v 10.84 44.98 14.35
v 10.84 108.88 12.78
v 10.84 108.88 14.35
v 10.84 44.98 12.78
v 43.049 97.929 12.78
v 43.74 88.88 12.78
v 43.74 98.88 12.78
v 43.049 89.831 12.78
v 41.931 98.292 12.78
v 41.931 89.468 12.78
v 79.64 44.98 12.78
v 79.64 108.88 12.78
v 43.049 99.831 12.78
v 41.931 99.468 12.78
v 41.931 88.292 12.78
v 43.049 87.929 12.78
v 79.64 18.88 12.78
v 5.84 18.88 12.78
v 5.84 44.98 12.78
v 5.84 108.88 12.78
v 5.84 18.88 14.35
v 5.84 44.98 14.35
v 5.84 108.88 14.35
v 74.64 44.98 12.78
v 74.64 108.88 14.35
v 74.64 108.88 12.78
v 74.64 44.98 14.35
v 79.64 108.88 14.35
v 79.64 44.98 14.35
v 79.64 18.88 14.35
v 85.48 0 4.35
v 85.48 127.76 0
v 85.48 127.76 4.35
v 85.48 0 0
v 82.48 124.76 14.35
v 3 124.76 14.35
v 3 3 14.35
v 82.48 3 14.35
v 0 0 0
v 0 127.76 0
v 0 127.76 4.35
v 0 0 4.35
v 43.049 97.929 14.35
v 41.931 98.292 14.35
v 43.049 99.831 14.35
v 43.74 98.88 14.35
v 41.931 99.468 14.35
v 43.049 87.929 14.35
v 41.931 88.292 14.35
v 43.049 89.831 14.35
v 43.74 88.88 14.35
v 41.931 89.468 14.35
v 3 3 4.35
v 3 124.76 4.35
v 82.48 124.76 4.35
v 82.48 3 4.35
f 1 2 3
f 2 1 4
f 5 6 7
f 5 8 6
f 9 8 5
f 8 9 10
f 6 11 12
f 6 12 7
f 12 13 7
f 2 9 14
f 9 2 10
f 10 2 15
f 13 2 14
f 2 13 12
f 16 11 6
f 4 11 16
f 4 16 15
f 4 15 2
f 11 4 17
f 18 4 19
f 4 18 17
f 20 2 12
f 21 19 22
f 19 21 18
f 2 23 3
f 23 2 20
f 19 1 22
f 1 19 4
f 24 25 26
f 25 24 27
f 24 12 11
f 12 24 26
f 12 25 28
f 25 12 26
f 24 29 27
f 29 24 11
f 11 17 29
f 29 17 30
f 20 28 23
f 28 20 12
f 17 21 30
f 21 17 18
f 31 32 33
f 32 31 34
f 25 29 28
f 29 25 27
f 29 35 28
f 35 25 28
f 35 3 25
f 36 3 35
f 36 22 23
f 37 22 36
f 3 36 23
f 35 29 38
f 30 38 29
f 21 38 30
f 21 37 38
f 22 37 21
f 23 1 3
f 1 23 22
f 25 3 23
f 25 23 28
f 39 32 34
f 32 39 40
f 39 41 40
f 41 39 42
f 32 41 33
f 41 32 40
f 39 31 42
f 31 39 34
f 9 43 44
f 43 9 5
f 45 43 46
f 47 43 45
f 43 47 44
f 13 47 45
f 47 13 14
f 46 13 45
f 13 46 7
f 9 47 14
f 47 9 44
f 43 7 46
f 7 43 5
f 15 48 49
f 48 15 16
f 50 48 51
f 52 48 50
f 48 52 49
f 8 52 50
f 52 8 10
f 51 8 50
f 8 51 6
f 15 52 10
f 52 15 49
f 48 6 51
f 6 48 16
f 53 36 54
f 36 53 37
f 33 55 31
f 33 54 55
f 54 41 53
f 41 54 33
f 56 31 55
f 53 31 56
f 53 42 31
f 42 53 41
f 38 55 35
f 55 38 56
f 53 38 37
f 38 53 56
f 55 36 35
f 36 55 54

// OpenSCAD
//substrate
max_height = 14.35;
max_length = 127.76;
max_width = 85.48;
bezel_width = 3;

// graphenea card
pcb_width = 1.57;
graphenea_card_width = 73.8;
graphenea_card_length = 90;

module workpiece (width, depth, height) {
  cube([width, depth, height]);
}

module grapheneaCardOutline() {
  module cardCutout() {
    translate([0, 5, 0]) {
      union() {
        cube([5, 63.9, pcb_width]);
        translate([0, 0, pcb_width]) {
          rotate(a=180, [1, 0, 0]){
            intersection() {
              cube([5, 5, pcb_width]);
              cylinder(h=pcb_width, r=5);
            }
          }
        }
      }
    }
  }

  difference() {
    cube([graphenea_card_width, graphenea_card_length, pcb_width]);
    translate([0, 21.1, 0]) {
      cardCutout();
    }
    translate([graphenea_card_width, 21.1, pcb_width]) {
      rotate(180, [0, 1, 0]) {
        cardCutout();
      }
    }
  }
}

module bezel(width, height, length) {
  translate([0, 0, height]) {
    difference() {
      cube([width, length, 10]);
      polyhedron(points=[[0, 0, 0],
                         [width, 0, 0],
                         [width, length, 0],
                         [0, length, 0],
                         [width, 0, 2],
                         [width, length, 2]],
                 faces=[
                        [0, 1, 2, 3], // bottom
                        [0, 1, 4],     // front
                        [4, 5],        // top
                        [1, 2, 5, 4], // right
                        [2, 3, 5],    // back
                        [0, 3, 5, 4]  // left
                        ]);
    }
  }
}

module grapheneaCardOT2Adapter() {
  difference() {
    union() {
      difference() {
        workpiece(max_width, max_length,max_height);
        translate([(max_width-graphenea_card_width)/2,
                   (max_length-graphenea_card_length)/2,
                   max_height-pcb_width]) {
          grapheneaCardOutline();
        }
      }

      translate([max_width/2,
                 (max_length - ((max_length-graphenea_card_length)/2)) - 10,
                 0]) {
        cylinder(h=max_height, r=1);
      }

      translate([max_width/2,
                 (max_length - ((max_length-graphenea_card_length)/2)) - 20,
                 0]) {
        cylinder(h=max_height, r=1);
      }
    }

    bezel(bezel_width, max_height-10, max_length);

    translate([max_width, max_length, 0]) {
      rotate(180, [0,0,1]) {
        bezel(bezel_width, max_height-10, max_length);
      }
    }

    translate([max_width, 0, 0]) {
      rotate(90, [0, 0, 1]) {
        bezel(bezel_width, max_height-10, max_width);
      }
    }

    translate([0, max_length, 0]) {
      rotate(270, [0,0,1]) {
        bezel(bezel_width, max_height-10, max_width);
      }
    }
  }
}


// Render complete adapter
grapheneaCardOT2Adapter();
